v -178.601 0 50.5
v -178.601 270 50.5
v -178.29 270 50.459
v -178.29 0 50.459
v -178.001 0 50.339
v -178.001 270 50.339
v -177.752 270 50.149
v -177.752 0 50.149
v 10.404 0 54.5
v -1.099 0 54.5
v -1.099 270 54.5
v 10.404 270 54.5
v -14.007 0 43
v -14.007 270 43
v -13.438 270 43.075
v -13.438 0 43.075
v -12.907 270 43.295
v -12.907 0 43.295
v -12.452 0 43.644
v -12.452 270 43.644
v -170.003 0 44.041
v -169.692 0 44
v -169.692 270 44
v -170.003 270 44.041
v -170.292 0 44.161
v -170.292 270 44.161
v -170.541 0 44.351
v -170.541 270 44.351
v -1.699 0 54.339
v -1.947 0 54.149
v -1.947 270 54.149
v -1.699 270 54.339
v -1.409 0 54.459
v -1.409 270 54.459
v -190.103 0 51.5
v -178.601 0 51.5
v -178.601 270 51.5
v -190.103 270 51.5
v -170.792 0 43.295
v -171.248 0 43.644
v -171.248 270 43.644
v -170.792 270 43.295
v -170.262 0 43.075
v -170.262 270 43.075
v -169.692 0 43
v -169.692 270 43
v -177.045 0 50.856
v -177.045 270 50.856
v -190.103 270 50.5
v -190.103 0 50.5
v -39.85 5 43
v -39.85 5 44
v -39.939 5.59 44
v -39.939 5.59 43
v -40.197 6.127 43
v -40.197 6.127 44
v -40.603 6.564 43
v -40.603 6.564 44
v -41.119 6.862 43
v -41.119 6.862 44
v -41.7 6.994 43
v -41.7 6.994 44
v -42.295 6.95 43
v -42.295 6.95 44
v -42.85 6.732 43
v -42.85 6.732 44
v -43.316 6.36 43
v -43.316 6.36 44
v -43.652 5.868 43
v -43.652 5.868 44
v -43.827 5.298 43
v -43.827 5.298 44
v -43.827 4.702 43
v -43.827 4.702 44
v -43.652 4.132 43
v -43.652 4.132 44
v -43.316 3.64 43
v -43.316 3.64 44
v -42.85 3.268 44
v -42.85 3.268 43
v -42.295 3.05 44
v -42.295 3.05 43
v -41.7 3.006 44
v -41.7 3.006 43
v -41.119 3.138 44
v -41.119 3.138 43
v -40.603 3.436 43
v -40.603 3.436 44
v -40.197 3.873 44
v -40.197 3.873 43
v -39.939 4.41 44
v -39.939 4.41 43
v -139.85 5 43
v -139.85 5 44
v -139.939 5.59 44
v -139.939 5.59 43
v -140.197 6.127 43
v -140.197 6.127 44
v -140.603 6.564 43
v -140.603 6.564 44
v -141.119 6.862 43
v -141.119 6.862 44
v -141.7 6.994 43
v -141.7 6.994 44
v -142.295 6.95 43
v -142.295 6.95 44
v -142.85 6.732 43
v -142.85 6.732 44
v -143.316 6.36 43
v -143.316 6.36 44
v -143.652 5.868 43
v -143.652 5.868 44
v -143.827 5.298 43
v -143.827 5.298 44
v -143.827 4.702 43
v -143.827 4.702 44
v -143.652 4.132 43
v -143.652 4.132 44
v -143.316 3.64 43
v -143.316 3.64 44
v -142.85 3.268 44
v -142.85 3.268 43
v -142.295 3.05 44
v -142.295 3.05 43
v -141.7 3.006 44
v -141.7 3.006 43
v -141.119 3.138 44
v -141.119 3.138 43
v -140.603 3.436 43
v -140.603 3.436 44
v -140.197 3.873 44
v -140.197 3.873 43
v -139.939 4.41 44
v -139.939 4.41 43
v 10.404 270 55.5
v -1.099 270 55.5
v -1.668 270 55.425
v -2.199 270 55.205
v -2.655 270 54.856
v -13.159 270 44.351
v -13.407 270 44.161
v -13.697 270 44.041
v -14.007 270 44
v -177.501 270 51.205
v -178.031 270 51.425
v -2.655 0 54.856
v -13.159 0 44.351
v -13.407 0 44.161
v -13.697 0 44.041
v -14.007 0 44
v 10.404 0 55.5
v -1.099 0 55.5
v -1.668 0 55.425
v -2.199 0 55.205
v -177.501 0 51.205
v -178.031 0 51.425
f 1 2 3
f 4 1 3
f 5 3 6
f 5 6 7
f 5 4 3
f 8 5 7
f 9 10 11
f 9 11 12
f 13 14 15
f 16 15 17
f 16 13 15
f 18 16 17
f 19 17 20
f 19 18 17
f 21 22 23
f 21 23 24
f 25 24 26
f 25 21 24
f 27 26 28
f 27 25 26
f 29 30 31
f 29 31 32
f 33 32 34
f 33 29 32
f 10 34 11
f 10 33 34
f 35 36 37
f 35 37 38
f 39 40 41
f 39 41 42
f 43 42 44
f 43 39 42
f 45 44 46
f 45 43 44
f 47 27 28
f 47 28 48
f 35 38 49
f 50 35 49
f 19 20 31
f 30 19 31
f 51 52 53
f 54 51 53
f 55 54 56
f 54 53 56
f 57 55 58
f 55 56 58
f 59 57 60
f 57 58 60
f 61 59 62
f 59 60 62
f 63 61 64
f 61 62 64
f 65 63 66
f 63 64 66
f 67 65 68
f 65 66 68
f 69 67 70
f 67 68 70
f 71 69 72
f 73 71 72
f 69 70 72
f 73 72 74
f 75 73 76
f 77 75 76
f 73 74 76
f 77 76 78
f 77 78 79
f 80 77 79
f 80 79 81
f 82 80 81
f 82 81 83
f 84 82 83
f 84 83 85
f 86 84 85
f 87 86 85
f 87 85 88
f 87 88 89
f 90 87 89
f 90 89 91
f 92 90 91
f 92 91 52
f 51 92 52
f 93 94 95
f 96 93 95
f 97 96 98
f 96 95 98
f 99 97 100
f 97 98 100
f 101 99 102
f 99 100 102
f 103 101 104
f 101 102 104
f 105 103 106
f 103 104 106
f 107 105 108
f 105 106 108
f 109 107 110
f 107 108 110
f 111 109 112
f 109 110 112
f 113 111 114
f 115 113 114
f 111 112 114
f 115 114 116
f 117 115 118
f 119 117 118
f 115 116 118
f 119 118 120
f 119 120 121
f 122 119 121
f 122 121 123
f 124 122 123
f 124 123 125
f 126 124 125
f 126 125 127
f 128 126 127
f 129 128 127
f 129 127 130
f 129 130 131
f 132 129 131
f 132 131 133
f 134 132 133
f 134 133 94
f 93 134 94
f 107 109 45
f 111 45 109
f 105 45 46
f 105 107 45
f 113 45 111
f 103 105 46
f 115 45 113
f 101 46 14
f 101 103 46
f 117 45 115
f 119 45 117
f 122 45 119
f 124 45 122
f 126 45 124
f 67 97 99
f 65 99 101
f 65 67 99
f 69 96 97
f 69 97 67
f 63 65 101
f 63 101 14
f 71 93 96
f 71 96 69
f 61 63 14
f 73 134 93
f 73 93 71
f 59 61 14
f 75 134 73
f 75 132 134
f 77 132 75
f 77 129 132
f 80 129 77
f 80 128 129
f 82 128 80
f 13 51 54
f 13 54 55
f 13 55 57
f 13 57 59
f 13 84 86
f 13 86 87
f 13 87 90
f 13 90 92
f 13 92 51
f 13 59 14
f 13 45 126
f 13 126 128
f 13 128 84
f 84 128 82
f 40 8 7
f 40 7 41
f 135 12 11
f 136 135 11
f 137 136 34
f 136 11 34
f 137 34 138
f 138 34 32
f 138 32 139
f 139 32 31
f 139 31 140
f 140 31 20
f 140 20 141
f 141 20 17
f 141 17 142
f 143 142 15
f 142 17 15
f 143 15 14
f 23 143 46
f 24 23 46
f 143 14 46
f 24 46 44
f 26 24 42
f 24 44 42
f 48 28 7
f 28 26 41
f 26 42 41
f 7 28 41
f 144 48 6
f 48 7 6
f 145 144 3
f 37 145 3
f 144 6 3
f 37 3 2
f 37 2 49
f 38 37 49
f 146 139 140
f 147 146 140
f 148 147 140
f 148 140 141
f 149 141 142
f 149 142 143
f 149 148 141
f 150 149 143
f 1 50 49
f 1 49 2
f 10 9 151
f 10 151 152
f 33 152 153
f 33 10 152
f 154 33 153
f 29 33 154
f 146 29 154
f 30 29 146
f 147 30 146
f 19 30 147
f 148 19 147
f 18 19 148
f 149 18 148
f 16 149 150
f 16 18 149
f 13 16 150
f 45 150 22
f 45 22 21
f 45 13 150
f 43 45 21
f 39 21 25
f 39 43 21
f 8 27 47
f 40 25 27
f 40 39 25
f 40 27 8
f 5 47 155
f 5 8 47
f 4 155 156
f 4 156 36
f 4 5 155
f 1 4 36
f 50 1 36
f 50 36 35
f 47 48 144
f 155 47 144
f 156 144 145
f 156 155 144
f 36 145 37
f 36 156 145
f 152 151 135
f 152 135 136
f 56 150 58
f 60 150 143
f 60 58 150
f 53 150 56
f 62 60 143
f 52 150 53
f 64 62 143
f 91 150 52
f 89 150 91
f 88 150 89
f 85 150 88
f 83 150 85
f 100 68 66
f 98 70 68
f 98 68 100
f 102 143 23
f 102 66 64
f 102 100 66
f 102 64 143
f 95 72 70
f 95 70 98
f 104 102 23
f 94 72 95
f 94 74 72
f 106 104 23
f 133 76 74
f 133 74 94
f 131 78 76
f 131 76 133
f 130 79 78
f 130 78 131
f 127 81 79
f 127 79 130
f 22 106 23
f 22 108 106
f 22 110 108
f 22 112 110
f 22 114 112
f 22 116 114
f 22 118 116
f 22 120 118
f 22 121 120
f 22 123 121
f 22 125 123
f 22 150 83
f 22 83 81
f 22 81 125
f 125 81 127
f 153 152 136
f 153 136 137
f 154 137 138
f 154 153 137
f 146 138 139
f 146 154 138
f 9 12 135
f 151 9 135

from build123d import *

# Parameters (mm, degrees)
SM_BASE_FLANGE_1_DEPTH = 270
SKETCH_2_R             = 2
CUT_EXTRUDE_1_DEPTH    = 10


# Sheet-metal steps are written as plain solids
with BuildPart() as part:
    # Sketch 1 → Базовая кромка1 (new body)
    with BuildSketch(Plane(origin=(0, 0, 0), x_dir=(1, 0, 0), z_dir=(0, 1, 0))):
        with BuildLine():
            Line((-190.103499123, -50.5), (-178.600555398, -50.5))
            ThreePointArc((-178.600555398, -50.5), (-178.141335279, -50.408655439), (-177.75202726, -50.148528137))
            Line((-177.75202726, -50.148528137), (-171.247864204, -43.644365081))
            ThreePointArc((-171.247864204, -43.644365081), (-170.534132837, -43.167465028), (-169.692229286, -43))
            Line((-169.692229286, -43), (-14.007193009, -43))
            ThreePointArc((-14.007193009, -43), (-13.165289458, -43.167465028), (-12.451558091, -43.644365081))
            Line((-12.451558091, -43.644365081), (-1.947395035, -54.148528137))
            ThreePointArc((-1.947395035, -54.148528137), (-1.558087016, -54.408655439), (-1.098866897, -54.5))
            Line((-1.098866897, -54.5), (10.404076828, -54.5))
            Line((10.404076828, -54.5), (10.404076828, -55.5))
            Line((10.404076828, -55.5), (-1.098866897, -55.5))
            ThreePointArc((-1.098866897, -55.5), (-1.940770449, -55.332534972), (-2.654501816, -54.855634919))
            Line((-2.654501816, -54.855634919), (-13.158664872, -44.351471863))
            ThreePointArc((-13.158664872, -44.351471863), (-13.547972891, -44.091344561), (-14.007193009, -44))
            Line((-14.007193009, -44), (-169.692229286, -44))
            ThreePointArc((-169.692229286, -44), (-170.151449405, -44.091344561), (-170.540757423, -44.351471863))
            Line((-170.540757423, -44.351471863), (-177.044920479, -50.855634919))
            ThreePointArc((-177.044920479, -50.855634919), (-177.758651847, -51.332534972), (-178.600555398, -51.5))
            Line((-178.600555398, -51.5), (-190.103499123, -51.5))
            Line((-190.103499123, -51.5), (-190.103499123, -50.5))
        make_face()
    extrude(amount=SM_BASE_FLANGE_1_DEPTH)

    # Эскиз2 → Вырез-Вытянуть1 (cut)
    with BuildSketch(Plane.XY.offset(44)):
        with Locations((-141.849711148, 5)):
            Circle(SKETCH_2_R)
        with Locations((-41.849711148, 5)):
            Circle(SKETCH_2_R)
    extrude(amount=-CUT_EXTRUDE_1_DEPTH, mode=Mode.SUBTRACT)


solid = part.part
